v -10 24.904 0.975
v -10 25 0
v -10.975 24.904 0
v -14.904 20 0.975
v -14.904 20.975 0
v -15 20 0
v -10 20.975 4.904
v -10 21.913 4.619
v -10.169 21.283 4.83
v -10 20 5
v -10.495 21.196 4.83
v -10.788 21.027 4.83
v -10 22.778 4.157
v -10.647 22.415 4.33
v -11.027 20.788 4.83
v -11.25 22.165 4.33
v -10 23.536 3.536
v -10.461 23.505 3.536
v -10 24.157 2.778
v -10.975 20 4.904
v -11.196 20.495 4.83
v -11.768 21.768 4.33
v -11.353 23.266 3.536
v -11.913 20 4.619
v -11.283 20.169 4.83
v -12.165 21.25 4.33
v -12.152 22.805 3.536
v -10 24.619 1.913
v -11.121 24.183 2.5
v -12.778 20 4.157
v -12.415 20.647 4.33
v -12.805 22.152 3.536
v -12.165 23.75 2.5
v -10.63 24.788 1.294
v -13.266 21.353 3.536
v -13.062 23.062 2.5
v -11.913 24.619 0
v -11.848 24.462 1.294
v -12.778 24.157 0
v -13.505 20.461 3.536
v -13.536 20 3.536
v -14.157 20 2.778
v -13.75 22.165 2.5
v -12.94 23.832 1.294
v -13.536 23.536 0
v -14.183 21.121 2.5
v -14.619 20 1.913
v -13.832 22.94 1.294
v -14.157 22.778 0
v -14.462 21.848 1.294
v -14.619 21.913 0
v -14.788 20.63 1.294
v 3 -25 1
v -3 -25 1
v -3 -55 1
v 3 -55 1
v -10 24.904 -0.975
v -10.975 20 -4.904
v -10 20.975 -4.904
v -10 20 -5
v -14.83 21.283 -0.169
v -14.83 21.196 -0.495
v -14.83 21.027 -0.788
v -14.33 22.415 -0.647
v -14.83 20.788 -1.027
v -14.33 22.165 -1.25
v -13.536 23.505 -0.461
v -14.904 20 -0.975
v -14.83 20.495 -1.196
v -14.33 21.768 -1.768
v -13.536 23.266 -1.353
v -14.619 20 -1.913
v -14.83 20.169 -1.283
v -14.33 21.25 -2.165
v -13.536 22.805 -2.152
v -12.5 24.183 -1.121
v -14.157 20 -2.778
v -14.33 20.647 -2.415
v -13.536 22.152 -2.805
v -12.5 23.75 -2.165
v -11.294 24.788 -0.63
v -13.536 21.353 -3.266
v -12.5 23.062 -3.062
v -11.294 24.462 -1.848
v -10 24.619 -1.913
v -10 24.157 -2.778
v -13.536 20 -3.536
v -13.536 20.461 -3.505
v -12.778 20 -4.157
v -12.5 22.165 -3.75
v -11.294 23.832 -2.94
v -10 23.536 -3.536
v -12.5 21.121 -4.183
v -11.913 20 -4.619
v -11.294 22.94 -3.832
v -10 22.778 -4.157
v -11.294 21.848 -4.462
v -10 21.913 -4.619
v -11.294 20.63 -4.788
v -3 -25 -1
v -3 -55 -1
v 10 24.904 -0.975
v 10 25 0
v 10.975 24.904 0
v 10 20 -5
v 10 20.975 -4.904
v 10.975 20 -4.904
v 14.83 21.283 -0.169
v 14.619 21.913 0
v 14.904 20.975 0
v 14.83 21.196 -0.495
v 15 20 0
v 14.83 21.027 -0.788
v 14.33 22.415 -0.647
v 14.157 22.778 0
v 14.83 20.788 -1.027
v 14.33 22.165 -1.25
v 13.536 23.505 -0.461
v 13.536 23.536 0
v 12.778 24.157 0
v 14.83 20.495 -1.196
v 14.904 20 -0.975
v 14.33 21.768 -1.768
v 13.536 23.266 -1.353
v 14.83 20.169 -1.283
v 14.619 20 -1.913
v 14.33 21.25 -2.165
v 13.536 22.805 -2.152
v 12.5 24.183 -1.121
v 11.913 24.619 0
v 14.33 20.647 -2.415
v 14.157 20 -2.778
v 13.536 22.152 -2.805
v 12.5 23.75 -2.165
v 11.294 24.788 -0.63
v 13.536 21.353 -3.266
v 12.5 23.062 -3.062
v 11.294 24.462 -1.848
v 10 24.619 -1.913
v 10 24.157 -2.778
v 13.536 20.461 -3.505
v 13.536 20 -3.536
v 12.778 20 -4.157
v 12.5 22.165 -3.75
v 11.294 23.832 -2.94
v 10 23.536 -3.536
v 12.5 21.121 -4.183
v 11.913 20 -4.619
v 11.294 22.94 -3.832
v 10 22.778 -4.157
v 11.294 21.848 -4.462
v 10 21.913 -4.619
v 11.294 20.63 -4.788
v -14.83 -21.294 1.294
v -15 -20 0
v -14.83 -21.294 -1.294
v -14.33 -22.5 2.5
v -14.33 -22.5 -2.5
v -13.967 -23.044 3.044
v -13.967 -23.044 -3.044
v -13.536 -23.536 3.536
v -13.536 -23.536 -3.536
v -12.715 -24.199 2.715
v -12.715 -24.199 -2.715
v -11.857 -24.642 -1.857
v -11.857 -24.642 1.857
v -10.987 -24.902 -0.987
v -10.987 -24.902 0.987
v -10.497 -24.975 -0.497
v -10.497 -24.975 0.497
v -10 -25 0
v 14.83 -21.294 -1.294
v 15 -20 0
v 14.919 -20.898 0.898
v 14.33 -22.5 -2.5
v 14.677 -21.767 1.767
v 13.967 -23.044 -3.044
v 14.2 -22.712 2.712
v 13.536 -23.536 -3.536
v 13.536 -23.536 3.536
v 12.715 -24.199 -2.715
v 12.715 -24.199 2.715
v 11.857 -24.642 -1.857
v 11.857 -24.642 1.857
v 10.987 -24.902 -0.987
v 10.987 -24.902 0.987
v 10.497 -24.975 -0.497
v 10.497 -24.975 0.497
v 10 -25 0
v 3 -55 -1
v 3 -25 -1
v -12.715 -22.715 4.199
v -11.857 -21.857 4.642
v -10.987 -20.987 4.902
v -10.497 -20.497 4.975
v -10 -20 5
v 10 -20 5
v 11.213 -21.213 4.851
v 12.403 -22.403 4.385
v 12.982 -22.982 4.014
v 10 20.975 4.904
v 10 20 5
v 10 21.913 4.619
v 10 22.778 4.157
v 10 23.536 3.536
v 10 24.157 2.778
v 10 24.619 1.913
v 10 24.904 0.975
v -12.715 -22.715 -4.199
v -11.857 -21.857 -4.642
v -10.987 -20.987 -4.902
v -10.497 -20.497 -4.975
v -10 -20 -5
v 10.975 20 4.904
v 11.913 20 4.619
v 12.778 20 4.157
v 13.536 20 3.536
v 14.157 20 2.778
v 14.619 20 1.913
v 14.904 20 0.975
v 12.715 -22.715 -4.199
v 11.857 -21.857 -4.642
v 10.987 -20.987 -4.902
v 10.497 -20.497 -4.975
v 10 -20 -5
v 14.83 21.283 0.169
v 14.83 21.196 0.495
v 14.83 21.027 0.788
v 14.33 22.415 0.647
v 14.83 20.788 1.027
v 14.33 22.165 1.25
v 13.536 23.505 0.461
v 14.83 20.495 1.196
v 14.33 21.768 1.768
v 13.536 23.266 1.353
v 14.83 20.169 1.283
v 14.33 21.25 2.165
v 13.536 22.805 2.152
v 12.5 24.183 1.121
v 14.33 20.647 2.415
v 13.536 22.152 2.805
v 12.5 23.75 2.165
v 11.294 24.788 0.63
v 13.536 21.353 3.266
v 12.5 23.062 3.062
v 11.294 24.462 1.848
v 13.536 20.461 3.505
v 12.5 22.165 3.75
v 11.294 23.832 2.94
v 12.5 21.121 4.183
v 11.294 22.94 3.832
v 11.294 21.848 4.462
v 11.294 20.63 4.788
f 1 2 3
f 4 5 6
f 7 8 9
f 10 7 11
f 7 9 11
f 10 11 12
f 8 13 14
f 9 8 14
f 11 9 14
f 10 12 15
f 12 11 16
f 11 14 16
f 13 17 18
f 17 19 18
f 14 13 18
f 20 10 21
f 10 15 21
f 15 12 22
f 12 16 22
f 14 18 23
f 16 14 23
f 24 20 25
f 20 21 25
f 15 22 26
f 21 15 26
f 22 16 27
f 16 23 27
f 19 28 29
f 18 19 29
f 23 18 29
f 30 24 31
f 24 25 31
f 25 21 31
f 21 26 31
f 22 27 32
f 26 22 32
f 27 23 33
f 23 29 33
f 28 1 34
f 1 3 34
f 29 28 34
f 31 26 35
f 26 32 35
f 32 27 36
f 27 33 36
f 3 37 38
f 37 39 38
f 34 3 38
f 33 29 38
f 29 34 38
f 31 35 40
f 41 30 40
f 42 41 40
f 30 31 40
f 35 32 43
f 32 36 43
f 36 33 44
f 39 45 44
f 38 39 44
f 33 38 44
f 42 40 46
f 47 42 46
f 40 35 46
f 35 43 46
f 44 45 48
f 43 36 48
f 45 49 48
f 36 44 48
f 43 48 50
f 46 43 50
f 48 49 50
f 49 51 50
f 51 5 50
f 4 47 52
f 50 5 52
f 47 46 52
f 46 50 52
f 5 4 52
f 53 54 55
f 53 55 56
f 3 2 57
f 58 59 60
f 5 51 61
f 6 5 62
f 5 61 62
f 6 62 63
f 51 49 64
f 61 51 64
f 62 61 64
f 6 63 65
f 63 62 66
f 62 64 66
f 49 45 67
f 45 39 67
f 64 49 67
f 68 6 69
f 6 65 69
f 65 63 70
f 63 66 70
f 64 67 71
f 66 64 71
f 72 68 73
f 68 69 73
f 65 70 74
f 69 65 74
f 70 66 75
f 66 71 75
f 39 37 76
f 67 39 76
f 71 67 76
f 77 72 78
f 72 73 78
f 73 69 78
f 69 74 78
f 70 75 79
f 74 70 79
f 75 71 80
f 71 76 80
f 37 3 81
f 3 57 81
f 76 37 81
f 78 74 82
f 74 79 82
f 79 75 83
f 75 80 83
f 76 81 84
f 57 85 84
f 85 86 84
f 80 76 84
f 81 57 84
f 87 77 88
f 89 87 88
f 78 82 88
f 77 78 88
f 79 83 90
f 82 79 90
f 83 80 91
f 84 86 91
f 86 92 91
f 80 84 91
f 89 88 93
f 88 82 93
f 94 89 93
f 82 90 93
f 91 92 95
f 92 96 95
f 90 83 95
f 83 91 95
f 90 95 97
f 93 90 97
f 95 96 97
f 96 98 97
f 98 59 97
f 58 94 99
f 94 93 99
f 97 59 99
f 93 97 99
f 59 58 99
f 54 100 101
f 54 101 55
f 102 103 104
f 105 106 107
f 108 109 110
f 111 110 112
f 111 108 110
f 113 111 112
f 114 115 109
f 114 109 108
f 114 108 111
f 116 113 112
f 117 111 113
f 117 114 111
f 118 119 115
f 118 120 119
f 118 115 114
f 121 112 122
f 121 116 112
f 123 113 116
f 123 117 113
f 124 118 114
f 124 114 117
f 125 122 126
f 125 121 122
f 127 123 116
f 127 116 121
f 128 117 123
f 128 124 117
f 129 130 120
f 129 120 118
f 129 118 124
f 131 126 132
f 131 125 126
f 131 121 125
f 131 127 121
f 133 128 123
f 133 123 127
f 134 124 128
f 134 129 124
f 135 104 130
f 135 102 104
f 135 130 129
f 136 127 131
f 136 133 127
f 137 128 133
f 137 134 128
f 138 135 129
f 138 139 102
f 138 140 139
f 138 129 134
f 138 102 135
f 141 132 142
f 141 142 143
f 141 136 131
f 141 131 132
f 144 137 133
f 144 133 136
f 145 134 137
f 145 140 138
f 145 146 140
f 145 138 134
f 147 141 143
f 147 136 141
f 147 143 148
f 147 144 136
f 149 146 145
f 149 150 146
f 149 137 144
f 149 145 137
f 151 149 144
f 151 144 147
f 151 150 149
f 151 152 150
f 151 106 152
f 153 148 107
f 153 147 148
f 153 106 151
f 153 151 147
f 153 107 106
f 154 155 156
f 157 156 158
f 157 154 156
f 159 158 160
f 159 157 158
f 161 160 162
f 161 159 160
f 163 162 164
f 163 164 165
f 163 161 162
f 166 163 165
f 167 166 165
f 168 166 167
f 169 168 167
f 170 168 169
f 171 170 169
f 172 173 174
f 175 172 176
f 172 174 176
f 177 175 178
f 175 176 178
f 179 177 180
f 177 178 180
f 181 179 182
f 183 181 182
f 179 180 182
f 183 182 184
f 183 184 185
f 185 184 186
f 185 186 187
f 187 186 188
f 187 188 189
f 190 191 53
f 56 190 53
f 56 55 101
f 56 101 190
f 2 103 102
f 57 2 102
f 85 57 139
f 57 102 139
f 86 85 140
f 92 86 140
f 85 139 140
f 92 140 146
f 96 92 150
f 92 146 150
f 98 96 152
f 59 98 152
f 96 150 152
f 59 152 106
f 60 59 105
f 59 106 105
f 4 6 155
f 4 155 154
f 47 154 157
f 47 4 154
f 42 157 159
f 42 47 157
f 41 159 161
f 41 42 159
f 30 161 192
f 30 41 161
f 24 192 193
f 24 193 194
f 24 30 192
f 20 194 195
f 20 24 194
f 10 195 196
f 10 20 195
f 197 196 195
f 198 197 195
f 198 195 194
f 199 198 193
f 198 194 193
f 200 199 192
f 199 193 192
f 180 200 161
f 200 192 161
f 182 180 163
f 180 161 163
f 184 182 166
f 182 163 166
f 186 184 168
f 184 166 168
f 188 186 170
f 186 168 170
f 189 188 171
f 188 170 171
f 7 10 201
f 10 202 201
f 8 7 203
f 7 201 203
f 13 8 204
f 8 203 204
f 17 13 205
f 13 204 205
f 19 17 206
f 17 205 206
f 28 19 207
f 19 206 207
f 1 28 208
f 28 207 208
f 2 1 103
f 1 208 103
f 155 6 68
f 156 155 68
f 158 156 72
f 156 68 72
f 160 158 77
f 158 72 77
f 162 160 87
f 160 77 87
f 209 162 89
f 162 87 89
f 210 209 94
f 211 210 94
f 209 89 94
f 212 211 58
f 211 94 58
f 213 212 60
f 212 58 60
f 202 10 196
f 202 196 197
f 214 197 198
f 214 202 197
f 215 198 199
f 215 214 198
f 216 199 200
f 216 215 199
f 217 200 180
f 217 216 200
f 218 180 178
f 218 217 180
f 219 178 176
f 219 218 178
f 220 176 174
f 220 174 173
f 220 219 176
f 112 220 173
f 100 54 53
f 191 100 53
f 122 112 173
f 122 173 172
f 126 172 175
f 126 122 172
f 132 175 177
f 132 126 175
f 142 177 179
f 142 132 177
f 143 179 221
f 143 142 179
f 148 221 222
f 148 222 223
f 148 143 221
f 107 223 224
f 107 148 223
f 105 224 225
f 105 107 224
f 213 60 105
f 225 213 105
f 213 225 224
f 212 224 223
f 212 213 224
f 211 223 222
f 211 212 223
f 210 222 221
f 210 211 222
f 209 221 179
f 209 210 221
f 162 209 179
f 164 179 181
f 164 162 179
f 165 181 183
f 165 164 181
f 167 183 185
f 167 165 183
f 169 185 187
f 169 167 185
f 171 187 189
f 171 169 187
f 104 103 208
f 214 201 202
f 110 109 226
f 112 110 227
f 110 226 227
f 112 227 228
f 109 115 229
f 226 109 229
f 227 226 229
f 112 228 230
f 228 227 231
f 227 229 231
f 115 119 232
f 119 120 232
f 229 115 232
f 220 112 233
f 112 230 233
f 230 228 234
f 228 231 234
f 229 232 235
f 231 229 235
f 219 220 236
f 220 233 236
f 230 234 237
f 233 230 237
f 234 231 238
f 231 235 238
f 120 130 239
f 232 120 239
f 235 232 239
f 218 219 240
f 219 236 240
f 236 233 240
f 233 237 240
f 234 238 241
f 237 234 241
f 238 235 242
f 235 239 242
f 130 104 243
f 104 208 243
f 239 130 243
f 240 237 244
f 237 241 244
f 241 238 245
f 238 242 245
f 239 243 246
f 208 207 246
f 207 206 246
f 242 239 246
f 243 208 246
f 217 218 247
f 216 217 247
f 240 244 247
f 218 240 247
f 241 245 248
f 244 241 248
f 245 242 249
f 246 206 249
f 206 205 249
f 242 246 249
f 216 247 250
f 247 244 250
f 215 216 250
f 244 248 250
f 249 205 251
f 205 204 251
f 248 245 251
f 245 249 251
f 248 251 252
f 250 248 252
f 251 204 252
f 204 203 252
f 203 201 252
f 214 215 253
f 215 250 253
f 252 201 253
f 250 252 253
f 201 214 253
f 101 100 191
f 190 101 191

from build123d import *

# Parameters (mm, degrees)
F0_W        = 30
F0_H        = 50
F1_DEPTH    = 5
F2_R        = 4.99999
F3_W        = 6
F3_H        = 2
F4_DEPTH    = 30
F5_T1_DEPTH = 45.00002


# Not quite as in the source:
# - a fillet or chamfer that OpenCascade refuses, or shapes differently, is made with other operations: its cross-section is extruded or revolved along the edge and cut away or added
# - a fillet or chamfer is up to 0.001 mm smaller than in the source, because OpenCascade refuses the exact size


with BuildPart() as f1:
    # F0 (on Top) → F1 (new body, symmetric)
    with BuildSketch(Plane.XY):
        Rectangle(F0_W, F0_H)
    extrude(amount=F1_DEPTH, both=True)

    # F2 (radius 5 in the source; OpenCascade refuses exactly that, so slightly less here)
    f2_edges = [f1.edges().sort_by_distance(p)[0] for p in [
        (0, 25, -5),
        (-15, 25, 0),
        (0, 25, 5),
        (15, 25, 0),
        (-15, 0, -5),
        (-15, -25, 0),
        (-15, 0, 5),
        (15, 0, -5),
        (15, 0, 5),
        (15, -25, 0),
    ]]
    fillet(f2_edges, radius=F2_R)

    # F5: fillet of radius 5 on 8 edges, made by hand

    # F5_s2 → F5_t1 (cut)
    with BuildSketch(Plane.YZ.offset(-22.50001)):
        with BuildLine():
            ThreePointArc((-20, 5), (-23.5355339059, 3.5355339059), (-25, 0))
            Line((-25, 0), (-25, 5))
            Line((-25, 5), (-20, 5))
        make_face()
        with BuildLine():
            ThreePointArc((-20, -5), (-23.5355339059, -3.5355339059), (-25, 0))
            Line((-25, 0), (-25, -5))
            Line((-25, -5), (-20, -5))
        make_face()
    extrude(amount=F5_T1_DEPTH, mode=Mode.SUBTRACT)


with BuildPart() as f4:
    # F3 (on face) → F4 (new body)
    with BuildSketch(Plane.XZ.offset(25)):
        Rectangle(F3_W, F3_H)
    extrude(amount=F4_DEPTH)


solid = Compound([f1.part, f4.part])
